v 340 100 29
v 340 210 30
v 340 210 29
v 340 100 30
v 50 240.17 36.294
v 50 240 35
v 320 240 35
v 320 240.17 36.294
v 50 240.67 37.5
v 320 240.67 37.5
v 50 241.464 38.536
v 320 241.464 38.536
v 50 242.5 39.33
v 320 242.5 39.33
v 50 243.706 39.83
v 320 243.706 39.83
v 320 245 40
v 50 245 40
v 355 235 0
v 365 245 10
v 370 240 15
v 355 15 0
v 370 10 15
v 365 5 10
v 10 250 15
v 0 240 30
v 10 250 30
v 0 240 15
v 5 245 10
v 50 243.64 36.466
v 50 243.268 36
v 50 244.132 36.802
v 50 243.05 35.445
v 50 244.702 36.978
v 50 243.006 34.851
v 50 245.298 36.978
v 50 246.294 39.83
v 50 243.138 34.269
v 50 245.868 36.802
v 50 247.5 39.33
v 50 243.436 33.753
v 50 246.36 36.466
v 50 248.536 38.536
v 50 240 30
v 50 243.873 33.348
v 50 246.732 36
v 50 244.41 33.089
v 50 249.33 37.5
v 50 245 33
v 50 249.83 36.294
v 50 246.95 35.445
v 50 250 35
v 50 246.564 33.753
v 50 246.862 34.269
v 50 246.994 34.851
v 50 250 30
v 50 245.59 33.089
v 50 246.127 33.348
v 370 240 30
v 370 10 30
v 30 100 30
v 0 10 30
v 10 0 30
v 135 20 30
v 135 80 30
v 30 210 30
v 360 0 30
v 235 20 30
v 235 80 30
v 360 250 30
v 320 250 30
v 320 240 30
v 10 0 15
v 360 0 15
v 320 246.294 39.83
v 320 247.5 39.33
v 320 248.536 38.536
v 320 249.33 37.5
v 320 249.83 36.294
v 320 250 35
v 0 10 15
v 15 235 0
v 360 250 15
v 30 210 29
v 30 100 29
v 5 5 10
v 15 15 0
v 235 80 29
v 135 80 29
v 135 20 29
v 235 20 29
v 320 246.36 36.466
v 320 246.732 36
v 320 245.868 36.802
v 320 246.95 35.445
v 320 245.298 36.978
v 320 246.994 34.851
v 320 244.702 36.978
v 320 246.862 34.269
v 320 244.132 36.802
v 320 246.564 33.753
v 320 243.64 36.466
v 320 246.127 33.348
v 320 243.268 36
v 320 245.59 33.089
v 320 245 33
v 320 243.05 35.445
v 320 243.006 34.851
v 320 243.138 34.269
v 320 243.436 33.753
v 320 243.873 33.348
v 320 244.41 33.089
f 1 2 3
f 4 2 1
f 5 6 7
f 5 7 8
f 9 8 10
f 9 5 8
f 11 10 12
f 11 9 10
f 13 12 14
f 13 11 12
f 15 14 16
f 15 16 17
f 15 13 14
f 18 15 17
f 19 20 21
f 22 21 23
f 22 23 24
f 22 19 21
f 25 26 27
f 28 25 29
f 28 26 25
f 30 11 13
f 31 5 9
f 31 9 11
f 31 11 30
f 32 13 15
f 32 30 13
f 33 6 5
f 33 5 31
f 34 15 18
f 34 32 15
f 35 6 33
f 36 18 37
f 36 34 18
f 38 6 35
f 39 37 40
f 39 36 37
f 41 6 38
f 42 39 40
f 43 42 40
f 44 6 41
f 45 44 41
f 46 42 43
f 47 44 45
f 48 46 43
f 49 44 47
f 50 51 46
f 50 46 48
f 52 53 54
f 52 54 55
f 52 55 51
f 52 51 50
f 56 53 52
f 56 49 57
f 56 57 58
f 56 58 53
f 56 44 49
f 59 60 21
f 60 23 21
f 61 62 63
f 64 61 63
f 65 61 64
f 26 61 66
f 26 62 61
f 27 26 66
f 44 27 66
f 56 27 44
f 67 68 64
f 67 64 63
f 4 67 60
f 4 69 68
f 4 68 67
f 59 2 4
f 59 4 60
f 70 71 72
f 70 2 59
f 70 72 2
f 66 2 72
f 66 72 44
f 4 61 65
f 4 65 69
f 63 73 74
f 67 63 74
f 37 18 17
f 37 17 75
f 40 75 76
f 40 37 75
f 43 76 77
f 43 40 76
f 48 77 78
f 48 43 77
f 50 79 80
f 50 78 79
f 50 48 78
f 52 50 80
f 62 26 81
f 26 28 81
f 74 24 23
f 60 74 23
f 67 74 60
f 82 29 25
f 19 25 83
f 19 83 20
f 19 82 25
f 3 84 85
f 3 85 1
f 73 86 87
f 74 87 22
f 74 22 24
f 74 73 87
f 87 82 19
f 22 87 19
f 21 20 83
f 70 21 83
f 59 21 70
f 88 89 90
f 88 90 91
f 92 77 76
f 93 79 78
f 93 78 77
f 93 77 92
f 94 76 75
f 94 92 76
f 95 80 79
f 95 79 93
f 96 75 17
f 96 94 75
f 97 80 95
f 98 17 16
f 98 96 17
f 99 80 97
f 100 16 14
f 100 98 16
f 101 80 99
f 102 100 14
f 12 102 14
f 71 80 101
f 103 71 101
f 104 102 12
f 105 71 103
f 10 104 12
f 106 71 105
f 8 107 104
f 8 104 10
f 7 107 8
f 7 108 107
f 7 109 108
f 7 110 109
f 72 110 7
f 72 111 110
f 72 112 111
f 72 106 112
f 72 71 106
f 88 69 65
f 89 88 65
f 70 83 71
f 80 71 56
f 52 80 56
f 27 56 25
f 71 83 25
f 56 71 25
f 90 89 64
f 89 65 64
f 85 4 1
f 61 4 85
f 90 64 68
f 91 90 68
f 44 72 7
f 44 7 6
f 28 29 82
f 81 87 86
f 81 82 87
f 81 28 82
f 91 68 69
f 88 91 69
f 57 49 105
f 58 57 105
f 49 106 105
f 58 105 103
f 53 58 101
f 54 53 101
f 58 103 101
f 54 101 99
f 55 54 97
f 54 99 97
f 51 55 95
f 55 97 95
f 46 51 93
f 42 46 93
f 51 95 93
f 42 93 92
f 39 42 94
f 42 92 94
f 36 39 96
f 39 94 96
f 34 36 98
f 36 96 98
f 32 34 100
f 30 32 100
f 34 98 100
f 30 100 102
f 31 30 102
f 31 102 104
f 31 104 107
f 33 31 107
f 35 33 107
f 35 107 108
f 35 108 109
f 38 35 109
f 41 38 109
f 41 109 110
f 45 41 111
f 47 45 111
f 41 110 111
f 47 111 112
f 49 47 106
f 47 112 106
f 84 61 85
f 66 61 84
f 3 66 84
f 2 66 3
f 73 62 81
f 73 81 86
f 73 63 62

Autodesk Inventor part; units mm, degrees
ref_plane "YZ Plane" through (0, 0, 0) normal (1, 0, 0) x (0, 1, 0)
ref_plane "XZ Plane" through (0, 0, 0) normal (0, 1, 0) x (-1, 0, 0)
ref_plane "XY Plane" through (0, 0, 0) normal (0, 0, 1) x (1, 0, 0)
sketch "スケッチ1" plane through (0, 0, 0) normal (0, 0, 1) x (1, 0, 0)
  line L0 (0, 0) -> (370, 0)
  line L1 (370, 0) -> (370, 250)
  line L2 (370, 250) -> (0, 250)
  line L3 (0, 250) -> (0, 0)
  dimension "d0" = 370
  dimension "d1" = 250
extrude "押し出し1" add sketch "スケッチ1" along normal blind 30
sketch "スケッチ2" plane through (0, 0, 30) normal (0, 0, 1) x (1, 0, 0)
  line L0 (370, 250) -> (0, 250) projected
  line L1 (50, 250) -> (320, 250)
  line L2 (320, 250) -> (320, 240)
  line L3 (320, 240) -> (50, 240)
  line L4 (50, 240) -> (50, 250)
  line L5 (0, 250) -> (0, 0) projected
  line L6 (370, 0) -> (370, 250) projected
  dimension "d4" = 50
  dimension "d5" = 50
  dimension "d6" = 10
extrude "押し出し2" add sketch "スケッチ2" along normal blind 10
fillet "フィレット1" radius 5 2 edges at (185, 240, 40) (185, 250, 40)
chamfer "面取り1" distance 15 angle 45 4 edges at (185, 0, 0) (0, 125, 0) (370, 125, 0) (185, 250, 0)
sketch "スケッチ3" plane through (0, 0, 30) normal (0, 0, 1) x (1, 0, 0)
  line L0 (0, 0) -> (370, 0) projected
  line L1 (185, 0) -> (185, 50) construction
  line L2 (135, 20) -> (235, 20)
  line L3 (235, 20) -> (235, 80)
  line L4 (235, 80) -> (135, 80)
  line L5 (135, 80) -> (135, 20)
  line L6 (135, 20) -> (235, 80) construction
  line L7 (235, 20) -> (135, 80) construction
  line L8 (185, 50) -> (185, 155) construction
  line L9 (30, 210) -> (340, 210)
  line L10 (340, 210) -> (340, 100)
  line L11 (340, 100) -> (30, 100)
  line L12 (30, 100) -> (30, 210)
  line L13 (30, 210) -> (340, 100) construction
  line L14 (340, 210) -> (30, 100) construction
  line L15 (370, 250) -> (320, 250) construction
  line L16 (370, 0) -> (370, 250) construction
  dimension "d13" = 60
  dimension "d14" = 100
  dimension "d15" = 20
  dimension "d16" = 20
  dimension "d17" = 40
  dimension "d18" = 30
extrude "押し出し3" cut sketch "スケッチ3" against normal blind 1
chamfer "面取り2" distance 10 angle 45 4 edges at (370, 0, 22.5) (0, 0, 22.5) (370, 250, 22.5) (0, 250, 22.5)
sketch "スケッチ4" plane through (320, 240, 30) normal (1, 0, 0) x (0, 0, -1)
  arc A0 (-5, 10) -> (-5, 0) centre (-5, 5) ccw projected
  circle A1 centre (-5, 5) radius 2
  point P0 (30, -240)
  dimension "d24" = 4
extrude "押し出し4" cut sketch "スケッチ4" against normal up to next
properties part number "PCパーツ1"
